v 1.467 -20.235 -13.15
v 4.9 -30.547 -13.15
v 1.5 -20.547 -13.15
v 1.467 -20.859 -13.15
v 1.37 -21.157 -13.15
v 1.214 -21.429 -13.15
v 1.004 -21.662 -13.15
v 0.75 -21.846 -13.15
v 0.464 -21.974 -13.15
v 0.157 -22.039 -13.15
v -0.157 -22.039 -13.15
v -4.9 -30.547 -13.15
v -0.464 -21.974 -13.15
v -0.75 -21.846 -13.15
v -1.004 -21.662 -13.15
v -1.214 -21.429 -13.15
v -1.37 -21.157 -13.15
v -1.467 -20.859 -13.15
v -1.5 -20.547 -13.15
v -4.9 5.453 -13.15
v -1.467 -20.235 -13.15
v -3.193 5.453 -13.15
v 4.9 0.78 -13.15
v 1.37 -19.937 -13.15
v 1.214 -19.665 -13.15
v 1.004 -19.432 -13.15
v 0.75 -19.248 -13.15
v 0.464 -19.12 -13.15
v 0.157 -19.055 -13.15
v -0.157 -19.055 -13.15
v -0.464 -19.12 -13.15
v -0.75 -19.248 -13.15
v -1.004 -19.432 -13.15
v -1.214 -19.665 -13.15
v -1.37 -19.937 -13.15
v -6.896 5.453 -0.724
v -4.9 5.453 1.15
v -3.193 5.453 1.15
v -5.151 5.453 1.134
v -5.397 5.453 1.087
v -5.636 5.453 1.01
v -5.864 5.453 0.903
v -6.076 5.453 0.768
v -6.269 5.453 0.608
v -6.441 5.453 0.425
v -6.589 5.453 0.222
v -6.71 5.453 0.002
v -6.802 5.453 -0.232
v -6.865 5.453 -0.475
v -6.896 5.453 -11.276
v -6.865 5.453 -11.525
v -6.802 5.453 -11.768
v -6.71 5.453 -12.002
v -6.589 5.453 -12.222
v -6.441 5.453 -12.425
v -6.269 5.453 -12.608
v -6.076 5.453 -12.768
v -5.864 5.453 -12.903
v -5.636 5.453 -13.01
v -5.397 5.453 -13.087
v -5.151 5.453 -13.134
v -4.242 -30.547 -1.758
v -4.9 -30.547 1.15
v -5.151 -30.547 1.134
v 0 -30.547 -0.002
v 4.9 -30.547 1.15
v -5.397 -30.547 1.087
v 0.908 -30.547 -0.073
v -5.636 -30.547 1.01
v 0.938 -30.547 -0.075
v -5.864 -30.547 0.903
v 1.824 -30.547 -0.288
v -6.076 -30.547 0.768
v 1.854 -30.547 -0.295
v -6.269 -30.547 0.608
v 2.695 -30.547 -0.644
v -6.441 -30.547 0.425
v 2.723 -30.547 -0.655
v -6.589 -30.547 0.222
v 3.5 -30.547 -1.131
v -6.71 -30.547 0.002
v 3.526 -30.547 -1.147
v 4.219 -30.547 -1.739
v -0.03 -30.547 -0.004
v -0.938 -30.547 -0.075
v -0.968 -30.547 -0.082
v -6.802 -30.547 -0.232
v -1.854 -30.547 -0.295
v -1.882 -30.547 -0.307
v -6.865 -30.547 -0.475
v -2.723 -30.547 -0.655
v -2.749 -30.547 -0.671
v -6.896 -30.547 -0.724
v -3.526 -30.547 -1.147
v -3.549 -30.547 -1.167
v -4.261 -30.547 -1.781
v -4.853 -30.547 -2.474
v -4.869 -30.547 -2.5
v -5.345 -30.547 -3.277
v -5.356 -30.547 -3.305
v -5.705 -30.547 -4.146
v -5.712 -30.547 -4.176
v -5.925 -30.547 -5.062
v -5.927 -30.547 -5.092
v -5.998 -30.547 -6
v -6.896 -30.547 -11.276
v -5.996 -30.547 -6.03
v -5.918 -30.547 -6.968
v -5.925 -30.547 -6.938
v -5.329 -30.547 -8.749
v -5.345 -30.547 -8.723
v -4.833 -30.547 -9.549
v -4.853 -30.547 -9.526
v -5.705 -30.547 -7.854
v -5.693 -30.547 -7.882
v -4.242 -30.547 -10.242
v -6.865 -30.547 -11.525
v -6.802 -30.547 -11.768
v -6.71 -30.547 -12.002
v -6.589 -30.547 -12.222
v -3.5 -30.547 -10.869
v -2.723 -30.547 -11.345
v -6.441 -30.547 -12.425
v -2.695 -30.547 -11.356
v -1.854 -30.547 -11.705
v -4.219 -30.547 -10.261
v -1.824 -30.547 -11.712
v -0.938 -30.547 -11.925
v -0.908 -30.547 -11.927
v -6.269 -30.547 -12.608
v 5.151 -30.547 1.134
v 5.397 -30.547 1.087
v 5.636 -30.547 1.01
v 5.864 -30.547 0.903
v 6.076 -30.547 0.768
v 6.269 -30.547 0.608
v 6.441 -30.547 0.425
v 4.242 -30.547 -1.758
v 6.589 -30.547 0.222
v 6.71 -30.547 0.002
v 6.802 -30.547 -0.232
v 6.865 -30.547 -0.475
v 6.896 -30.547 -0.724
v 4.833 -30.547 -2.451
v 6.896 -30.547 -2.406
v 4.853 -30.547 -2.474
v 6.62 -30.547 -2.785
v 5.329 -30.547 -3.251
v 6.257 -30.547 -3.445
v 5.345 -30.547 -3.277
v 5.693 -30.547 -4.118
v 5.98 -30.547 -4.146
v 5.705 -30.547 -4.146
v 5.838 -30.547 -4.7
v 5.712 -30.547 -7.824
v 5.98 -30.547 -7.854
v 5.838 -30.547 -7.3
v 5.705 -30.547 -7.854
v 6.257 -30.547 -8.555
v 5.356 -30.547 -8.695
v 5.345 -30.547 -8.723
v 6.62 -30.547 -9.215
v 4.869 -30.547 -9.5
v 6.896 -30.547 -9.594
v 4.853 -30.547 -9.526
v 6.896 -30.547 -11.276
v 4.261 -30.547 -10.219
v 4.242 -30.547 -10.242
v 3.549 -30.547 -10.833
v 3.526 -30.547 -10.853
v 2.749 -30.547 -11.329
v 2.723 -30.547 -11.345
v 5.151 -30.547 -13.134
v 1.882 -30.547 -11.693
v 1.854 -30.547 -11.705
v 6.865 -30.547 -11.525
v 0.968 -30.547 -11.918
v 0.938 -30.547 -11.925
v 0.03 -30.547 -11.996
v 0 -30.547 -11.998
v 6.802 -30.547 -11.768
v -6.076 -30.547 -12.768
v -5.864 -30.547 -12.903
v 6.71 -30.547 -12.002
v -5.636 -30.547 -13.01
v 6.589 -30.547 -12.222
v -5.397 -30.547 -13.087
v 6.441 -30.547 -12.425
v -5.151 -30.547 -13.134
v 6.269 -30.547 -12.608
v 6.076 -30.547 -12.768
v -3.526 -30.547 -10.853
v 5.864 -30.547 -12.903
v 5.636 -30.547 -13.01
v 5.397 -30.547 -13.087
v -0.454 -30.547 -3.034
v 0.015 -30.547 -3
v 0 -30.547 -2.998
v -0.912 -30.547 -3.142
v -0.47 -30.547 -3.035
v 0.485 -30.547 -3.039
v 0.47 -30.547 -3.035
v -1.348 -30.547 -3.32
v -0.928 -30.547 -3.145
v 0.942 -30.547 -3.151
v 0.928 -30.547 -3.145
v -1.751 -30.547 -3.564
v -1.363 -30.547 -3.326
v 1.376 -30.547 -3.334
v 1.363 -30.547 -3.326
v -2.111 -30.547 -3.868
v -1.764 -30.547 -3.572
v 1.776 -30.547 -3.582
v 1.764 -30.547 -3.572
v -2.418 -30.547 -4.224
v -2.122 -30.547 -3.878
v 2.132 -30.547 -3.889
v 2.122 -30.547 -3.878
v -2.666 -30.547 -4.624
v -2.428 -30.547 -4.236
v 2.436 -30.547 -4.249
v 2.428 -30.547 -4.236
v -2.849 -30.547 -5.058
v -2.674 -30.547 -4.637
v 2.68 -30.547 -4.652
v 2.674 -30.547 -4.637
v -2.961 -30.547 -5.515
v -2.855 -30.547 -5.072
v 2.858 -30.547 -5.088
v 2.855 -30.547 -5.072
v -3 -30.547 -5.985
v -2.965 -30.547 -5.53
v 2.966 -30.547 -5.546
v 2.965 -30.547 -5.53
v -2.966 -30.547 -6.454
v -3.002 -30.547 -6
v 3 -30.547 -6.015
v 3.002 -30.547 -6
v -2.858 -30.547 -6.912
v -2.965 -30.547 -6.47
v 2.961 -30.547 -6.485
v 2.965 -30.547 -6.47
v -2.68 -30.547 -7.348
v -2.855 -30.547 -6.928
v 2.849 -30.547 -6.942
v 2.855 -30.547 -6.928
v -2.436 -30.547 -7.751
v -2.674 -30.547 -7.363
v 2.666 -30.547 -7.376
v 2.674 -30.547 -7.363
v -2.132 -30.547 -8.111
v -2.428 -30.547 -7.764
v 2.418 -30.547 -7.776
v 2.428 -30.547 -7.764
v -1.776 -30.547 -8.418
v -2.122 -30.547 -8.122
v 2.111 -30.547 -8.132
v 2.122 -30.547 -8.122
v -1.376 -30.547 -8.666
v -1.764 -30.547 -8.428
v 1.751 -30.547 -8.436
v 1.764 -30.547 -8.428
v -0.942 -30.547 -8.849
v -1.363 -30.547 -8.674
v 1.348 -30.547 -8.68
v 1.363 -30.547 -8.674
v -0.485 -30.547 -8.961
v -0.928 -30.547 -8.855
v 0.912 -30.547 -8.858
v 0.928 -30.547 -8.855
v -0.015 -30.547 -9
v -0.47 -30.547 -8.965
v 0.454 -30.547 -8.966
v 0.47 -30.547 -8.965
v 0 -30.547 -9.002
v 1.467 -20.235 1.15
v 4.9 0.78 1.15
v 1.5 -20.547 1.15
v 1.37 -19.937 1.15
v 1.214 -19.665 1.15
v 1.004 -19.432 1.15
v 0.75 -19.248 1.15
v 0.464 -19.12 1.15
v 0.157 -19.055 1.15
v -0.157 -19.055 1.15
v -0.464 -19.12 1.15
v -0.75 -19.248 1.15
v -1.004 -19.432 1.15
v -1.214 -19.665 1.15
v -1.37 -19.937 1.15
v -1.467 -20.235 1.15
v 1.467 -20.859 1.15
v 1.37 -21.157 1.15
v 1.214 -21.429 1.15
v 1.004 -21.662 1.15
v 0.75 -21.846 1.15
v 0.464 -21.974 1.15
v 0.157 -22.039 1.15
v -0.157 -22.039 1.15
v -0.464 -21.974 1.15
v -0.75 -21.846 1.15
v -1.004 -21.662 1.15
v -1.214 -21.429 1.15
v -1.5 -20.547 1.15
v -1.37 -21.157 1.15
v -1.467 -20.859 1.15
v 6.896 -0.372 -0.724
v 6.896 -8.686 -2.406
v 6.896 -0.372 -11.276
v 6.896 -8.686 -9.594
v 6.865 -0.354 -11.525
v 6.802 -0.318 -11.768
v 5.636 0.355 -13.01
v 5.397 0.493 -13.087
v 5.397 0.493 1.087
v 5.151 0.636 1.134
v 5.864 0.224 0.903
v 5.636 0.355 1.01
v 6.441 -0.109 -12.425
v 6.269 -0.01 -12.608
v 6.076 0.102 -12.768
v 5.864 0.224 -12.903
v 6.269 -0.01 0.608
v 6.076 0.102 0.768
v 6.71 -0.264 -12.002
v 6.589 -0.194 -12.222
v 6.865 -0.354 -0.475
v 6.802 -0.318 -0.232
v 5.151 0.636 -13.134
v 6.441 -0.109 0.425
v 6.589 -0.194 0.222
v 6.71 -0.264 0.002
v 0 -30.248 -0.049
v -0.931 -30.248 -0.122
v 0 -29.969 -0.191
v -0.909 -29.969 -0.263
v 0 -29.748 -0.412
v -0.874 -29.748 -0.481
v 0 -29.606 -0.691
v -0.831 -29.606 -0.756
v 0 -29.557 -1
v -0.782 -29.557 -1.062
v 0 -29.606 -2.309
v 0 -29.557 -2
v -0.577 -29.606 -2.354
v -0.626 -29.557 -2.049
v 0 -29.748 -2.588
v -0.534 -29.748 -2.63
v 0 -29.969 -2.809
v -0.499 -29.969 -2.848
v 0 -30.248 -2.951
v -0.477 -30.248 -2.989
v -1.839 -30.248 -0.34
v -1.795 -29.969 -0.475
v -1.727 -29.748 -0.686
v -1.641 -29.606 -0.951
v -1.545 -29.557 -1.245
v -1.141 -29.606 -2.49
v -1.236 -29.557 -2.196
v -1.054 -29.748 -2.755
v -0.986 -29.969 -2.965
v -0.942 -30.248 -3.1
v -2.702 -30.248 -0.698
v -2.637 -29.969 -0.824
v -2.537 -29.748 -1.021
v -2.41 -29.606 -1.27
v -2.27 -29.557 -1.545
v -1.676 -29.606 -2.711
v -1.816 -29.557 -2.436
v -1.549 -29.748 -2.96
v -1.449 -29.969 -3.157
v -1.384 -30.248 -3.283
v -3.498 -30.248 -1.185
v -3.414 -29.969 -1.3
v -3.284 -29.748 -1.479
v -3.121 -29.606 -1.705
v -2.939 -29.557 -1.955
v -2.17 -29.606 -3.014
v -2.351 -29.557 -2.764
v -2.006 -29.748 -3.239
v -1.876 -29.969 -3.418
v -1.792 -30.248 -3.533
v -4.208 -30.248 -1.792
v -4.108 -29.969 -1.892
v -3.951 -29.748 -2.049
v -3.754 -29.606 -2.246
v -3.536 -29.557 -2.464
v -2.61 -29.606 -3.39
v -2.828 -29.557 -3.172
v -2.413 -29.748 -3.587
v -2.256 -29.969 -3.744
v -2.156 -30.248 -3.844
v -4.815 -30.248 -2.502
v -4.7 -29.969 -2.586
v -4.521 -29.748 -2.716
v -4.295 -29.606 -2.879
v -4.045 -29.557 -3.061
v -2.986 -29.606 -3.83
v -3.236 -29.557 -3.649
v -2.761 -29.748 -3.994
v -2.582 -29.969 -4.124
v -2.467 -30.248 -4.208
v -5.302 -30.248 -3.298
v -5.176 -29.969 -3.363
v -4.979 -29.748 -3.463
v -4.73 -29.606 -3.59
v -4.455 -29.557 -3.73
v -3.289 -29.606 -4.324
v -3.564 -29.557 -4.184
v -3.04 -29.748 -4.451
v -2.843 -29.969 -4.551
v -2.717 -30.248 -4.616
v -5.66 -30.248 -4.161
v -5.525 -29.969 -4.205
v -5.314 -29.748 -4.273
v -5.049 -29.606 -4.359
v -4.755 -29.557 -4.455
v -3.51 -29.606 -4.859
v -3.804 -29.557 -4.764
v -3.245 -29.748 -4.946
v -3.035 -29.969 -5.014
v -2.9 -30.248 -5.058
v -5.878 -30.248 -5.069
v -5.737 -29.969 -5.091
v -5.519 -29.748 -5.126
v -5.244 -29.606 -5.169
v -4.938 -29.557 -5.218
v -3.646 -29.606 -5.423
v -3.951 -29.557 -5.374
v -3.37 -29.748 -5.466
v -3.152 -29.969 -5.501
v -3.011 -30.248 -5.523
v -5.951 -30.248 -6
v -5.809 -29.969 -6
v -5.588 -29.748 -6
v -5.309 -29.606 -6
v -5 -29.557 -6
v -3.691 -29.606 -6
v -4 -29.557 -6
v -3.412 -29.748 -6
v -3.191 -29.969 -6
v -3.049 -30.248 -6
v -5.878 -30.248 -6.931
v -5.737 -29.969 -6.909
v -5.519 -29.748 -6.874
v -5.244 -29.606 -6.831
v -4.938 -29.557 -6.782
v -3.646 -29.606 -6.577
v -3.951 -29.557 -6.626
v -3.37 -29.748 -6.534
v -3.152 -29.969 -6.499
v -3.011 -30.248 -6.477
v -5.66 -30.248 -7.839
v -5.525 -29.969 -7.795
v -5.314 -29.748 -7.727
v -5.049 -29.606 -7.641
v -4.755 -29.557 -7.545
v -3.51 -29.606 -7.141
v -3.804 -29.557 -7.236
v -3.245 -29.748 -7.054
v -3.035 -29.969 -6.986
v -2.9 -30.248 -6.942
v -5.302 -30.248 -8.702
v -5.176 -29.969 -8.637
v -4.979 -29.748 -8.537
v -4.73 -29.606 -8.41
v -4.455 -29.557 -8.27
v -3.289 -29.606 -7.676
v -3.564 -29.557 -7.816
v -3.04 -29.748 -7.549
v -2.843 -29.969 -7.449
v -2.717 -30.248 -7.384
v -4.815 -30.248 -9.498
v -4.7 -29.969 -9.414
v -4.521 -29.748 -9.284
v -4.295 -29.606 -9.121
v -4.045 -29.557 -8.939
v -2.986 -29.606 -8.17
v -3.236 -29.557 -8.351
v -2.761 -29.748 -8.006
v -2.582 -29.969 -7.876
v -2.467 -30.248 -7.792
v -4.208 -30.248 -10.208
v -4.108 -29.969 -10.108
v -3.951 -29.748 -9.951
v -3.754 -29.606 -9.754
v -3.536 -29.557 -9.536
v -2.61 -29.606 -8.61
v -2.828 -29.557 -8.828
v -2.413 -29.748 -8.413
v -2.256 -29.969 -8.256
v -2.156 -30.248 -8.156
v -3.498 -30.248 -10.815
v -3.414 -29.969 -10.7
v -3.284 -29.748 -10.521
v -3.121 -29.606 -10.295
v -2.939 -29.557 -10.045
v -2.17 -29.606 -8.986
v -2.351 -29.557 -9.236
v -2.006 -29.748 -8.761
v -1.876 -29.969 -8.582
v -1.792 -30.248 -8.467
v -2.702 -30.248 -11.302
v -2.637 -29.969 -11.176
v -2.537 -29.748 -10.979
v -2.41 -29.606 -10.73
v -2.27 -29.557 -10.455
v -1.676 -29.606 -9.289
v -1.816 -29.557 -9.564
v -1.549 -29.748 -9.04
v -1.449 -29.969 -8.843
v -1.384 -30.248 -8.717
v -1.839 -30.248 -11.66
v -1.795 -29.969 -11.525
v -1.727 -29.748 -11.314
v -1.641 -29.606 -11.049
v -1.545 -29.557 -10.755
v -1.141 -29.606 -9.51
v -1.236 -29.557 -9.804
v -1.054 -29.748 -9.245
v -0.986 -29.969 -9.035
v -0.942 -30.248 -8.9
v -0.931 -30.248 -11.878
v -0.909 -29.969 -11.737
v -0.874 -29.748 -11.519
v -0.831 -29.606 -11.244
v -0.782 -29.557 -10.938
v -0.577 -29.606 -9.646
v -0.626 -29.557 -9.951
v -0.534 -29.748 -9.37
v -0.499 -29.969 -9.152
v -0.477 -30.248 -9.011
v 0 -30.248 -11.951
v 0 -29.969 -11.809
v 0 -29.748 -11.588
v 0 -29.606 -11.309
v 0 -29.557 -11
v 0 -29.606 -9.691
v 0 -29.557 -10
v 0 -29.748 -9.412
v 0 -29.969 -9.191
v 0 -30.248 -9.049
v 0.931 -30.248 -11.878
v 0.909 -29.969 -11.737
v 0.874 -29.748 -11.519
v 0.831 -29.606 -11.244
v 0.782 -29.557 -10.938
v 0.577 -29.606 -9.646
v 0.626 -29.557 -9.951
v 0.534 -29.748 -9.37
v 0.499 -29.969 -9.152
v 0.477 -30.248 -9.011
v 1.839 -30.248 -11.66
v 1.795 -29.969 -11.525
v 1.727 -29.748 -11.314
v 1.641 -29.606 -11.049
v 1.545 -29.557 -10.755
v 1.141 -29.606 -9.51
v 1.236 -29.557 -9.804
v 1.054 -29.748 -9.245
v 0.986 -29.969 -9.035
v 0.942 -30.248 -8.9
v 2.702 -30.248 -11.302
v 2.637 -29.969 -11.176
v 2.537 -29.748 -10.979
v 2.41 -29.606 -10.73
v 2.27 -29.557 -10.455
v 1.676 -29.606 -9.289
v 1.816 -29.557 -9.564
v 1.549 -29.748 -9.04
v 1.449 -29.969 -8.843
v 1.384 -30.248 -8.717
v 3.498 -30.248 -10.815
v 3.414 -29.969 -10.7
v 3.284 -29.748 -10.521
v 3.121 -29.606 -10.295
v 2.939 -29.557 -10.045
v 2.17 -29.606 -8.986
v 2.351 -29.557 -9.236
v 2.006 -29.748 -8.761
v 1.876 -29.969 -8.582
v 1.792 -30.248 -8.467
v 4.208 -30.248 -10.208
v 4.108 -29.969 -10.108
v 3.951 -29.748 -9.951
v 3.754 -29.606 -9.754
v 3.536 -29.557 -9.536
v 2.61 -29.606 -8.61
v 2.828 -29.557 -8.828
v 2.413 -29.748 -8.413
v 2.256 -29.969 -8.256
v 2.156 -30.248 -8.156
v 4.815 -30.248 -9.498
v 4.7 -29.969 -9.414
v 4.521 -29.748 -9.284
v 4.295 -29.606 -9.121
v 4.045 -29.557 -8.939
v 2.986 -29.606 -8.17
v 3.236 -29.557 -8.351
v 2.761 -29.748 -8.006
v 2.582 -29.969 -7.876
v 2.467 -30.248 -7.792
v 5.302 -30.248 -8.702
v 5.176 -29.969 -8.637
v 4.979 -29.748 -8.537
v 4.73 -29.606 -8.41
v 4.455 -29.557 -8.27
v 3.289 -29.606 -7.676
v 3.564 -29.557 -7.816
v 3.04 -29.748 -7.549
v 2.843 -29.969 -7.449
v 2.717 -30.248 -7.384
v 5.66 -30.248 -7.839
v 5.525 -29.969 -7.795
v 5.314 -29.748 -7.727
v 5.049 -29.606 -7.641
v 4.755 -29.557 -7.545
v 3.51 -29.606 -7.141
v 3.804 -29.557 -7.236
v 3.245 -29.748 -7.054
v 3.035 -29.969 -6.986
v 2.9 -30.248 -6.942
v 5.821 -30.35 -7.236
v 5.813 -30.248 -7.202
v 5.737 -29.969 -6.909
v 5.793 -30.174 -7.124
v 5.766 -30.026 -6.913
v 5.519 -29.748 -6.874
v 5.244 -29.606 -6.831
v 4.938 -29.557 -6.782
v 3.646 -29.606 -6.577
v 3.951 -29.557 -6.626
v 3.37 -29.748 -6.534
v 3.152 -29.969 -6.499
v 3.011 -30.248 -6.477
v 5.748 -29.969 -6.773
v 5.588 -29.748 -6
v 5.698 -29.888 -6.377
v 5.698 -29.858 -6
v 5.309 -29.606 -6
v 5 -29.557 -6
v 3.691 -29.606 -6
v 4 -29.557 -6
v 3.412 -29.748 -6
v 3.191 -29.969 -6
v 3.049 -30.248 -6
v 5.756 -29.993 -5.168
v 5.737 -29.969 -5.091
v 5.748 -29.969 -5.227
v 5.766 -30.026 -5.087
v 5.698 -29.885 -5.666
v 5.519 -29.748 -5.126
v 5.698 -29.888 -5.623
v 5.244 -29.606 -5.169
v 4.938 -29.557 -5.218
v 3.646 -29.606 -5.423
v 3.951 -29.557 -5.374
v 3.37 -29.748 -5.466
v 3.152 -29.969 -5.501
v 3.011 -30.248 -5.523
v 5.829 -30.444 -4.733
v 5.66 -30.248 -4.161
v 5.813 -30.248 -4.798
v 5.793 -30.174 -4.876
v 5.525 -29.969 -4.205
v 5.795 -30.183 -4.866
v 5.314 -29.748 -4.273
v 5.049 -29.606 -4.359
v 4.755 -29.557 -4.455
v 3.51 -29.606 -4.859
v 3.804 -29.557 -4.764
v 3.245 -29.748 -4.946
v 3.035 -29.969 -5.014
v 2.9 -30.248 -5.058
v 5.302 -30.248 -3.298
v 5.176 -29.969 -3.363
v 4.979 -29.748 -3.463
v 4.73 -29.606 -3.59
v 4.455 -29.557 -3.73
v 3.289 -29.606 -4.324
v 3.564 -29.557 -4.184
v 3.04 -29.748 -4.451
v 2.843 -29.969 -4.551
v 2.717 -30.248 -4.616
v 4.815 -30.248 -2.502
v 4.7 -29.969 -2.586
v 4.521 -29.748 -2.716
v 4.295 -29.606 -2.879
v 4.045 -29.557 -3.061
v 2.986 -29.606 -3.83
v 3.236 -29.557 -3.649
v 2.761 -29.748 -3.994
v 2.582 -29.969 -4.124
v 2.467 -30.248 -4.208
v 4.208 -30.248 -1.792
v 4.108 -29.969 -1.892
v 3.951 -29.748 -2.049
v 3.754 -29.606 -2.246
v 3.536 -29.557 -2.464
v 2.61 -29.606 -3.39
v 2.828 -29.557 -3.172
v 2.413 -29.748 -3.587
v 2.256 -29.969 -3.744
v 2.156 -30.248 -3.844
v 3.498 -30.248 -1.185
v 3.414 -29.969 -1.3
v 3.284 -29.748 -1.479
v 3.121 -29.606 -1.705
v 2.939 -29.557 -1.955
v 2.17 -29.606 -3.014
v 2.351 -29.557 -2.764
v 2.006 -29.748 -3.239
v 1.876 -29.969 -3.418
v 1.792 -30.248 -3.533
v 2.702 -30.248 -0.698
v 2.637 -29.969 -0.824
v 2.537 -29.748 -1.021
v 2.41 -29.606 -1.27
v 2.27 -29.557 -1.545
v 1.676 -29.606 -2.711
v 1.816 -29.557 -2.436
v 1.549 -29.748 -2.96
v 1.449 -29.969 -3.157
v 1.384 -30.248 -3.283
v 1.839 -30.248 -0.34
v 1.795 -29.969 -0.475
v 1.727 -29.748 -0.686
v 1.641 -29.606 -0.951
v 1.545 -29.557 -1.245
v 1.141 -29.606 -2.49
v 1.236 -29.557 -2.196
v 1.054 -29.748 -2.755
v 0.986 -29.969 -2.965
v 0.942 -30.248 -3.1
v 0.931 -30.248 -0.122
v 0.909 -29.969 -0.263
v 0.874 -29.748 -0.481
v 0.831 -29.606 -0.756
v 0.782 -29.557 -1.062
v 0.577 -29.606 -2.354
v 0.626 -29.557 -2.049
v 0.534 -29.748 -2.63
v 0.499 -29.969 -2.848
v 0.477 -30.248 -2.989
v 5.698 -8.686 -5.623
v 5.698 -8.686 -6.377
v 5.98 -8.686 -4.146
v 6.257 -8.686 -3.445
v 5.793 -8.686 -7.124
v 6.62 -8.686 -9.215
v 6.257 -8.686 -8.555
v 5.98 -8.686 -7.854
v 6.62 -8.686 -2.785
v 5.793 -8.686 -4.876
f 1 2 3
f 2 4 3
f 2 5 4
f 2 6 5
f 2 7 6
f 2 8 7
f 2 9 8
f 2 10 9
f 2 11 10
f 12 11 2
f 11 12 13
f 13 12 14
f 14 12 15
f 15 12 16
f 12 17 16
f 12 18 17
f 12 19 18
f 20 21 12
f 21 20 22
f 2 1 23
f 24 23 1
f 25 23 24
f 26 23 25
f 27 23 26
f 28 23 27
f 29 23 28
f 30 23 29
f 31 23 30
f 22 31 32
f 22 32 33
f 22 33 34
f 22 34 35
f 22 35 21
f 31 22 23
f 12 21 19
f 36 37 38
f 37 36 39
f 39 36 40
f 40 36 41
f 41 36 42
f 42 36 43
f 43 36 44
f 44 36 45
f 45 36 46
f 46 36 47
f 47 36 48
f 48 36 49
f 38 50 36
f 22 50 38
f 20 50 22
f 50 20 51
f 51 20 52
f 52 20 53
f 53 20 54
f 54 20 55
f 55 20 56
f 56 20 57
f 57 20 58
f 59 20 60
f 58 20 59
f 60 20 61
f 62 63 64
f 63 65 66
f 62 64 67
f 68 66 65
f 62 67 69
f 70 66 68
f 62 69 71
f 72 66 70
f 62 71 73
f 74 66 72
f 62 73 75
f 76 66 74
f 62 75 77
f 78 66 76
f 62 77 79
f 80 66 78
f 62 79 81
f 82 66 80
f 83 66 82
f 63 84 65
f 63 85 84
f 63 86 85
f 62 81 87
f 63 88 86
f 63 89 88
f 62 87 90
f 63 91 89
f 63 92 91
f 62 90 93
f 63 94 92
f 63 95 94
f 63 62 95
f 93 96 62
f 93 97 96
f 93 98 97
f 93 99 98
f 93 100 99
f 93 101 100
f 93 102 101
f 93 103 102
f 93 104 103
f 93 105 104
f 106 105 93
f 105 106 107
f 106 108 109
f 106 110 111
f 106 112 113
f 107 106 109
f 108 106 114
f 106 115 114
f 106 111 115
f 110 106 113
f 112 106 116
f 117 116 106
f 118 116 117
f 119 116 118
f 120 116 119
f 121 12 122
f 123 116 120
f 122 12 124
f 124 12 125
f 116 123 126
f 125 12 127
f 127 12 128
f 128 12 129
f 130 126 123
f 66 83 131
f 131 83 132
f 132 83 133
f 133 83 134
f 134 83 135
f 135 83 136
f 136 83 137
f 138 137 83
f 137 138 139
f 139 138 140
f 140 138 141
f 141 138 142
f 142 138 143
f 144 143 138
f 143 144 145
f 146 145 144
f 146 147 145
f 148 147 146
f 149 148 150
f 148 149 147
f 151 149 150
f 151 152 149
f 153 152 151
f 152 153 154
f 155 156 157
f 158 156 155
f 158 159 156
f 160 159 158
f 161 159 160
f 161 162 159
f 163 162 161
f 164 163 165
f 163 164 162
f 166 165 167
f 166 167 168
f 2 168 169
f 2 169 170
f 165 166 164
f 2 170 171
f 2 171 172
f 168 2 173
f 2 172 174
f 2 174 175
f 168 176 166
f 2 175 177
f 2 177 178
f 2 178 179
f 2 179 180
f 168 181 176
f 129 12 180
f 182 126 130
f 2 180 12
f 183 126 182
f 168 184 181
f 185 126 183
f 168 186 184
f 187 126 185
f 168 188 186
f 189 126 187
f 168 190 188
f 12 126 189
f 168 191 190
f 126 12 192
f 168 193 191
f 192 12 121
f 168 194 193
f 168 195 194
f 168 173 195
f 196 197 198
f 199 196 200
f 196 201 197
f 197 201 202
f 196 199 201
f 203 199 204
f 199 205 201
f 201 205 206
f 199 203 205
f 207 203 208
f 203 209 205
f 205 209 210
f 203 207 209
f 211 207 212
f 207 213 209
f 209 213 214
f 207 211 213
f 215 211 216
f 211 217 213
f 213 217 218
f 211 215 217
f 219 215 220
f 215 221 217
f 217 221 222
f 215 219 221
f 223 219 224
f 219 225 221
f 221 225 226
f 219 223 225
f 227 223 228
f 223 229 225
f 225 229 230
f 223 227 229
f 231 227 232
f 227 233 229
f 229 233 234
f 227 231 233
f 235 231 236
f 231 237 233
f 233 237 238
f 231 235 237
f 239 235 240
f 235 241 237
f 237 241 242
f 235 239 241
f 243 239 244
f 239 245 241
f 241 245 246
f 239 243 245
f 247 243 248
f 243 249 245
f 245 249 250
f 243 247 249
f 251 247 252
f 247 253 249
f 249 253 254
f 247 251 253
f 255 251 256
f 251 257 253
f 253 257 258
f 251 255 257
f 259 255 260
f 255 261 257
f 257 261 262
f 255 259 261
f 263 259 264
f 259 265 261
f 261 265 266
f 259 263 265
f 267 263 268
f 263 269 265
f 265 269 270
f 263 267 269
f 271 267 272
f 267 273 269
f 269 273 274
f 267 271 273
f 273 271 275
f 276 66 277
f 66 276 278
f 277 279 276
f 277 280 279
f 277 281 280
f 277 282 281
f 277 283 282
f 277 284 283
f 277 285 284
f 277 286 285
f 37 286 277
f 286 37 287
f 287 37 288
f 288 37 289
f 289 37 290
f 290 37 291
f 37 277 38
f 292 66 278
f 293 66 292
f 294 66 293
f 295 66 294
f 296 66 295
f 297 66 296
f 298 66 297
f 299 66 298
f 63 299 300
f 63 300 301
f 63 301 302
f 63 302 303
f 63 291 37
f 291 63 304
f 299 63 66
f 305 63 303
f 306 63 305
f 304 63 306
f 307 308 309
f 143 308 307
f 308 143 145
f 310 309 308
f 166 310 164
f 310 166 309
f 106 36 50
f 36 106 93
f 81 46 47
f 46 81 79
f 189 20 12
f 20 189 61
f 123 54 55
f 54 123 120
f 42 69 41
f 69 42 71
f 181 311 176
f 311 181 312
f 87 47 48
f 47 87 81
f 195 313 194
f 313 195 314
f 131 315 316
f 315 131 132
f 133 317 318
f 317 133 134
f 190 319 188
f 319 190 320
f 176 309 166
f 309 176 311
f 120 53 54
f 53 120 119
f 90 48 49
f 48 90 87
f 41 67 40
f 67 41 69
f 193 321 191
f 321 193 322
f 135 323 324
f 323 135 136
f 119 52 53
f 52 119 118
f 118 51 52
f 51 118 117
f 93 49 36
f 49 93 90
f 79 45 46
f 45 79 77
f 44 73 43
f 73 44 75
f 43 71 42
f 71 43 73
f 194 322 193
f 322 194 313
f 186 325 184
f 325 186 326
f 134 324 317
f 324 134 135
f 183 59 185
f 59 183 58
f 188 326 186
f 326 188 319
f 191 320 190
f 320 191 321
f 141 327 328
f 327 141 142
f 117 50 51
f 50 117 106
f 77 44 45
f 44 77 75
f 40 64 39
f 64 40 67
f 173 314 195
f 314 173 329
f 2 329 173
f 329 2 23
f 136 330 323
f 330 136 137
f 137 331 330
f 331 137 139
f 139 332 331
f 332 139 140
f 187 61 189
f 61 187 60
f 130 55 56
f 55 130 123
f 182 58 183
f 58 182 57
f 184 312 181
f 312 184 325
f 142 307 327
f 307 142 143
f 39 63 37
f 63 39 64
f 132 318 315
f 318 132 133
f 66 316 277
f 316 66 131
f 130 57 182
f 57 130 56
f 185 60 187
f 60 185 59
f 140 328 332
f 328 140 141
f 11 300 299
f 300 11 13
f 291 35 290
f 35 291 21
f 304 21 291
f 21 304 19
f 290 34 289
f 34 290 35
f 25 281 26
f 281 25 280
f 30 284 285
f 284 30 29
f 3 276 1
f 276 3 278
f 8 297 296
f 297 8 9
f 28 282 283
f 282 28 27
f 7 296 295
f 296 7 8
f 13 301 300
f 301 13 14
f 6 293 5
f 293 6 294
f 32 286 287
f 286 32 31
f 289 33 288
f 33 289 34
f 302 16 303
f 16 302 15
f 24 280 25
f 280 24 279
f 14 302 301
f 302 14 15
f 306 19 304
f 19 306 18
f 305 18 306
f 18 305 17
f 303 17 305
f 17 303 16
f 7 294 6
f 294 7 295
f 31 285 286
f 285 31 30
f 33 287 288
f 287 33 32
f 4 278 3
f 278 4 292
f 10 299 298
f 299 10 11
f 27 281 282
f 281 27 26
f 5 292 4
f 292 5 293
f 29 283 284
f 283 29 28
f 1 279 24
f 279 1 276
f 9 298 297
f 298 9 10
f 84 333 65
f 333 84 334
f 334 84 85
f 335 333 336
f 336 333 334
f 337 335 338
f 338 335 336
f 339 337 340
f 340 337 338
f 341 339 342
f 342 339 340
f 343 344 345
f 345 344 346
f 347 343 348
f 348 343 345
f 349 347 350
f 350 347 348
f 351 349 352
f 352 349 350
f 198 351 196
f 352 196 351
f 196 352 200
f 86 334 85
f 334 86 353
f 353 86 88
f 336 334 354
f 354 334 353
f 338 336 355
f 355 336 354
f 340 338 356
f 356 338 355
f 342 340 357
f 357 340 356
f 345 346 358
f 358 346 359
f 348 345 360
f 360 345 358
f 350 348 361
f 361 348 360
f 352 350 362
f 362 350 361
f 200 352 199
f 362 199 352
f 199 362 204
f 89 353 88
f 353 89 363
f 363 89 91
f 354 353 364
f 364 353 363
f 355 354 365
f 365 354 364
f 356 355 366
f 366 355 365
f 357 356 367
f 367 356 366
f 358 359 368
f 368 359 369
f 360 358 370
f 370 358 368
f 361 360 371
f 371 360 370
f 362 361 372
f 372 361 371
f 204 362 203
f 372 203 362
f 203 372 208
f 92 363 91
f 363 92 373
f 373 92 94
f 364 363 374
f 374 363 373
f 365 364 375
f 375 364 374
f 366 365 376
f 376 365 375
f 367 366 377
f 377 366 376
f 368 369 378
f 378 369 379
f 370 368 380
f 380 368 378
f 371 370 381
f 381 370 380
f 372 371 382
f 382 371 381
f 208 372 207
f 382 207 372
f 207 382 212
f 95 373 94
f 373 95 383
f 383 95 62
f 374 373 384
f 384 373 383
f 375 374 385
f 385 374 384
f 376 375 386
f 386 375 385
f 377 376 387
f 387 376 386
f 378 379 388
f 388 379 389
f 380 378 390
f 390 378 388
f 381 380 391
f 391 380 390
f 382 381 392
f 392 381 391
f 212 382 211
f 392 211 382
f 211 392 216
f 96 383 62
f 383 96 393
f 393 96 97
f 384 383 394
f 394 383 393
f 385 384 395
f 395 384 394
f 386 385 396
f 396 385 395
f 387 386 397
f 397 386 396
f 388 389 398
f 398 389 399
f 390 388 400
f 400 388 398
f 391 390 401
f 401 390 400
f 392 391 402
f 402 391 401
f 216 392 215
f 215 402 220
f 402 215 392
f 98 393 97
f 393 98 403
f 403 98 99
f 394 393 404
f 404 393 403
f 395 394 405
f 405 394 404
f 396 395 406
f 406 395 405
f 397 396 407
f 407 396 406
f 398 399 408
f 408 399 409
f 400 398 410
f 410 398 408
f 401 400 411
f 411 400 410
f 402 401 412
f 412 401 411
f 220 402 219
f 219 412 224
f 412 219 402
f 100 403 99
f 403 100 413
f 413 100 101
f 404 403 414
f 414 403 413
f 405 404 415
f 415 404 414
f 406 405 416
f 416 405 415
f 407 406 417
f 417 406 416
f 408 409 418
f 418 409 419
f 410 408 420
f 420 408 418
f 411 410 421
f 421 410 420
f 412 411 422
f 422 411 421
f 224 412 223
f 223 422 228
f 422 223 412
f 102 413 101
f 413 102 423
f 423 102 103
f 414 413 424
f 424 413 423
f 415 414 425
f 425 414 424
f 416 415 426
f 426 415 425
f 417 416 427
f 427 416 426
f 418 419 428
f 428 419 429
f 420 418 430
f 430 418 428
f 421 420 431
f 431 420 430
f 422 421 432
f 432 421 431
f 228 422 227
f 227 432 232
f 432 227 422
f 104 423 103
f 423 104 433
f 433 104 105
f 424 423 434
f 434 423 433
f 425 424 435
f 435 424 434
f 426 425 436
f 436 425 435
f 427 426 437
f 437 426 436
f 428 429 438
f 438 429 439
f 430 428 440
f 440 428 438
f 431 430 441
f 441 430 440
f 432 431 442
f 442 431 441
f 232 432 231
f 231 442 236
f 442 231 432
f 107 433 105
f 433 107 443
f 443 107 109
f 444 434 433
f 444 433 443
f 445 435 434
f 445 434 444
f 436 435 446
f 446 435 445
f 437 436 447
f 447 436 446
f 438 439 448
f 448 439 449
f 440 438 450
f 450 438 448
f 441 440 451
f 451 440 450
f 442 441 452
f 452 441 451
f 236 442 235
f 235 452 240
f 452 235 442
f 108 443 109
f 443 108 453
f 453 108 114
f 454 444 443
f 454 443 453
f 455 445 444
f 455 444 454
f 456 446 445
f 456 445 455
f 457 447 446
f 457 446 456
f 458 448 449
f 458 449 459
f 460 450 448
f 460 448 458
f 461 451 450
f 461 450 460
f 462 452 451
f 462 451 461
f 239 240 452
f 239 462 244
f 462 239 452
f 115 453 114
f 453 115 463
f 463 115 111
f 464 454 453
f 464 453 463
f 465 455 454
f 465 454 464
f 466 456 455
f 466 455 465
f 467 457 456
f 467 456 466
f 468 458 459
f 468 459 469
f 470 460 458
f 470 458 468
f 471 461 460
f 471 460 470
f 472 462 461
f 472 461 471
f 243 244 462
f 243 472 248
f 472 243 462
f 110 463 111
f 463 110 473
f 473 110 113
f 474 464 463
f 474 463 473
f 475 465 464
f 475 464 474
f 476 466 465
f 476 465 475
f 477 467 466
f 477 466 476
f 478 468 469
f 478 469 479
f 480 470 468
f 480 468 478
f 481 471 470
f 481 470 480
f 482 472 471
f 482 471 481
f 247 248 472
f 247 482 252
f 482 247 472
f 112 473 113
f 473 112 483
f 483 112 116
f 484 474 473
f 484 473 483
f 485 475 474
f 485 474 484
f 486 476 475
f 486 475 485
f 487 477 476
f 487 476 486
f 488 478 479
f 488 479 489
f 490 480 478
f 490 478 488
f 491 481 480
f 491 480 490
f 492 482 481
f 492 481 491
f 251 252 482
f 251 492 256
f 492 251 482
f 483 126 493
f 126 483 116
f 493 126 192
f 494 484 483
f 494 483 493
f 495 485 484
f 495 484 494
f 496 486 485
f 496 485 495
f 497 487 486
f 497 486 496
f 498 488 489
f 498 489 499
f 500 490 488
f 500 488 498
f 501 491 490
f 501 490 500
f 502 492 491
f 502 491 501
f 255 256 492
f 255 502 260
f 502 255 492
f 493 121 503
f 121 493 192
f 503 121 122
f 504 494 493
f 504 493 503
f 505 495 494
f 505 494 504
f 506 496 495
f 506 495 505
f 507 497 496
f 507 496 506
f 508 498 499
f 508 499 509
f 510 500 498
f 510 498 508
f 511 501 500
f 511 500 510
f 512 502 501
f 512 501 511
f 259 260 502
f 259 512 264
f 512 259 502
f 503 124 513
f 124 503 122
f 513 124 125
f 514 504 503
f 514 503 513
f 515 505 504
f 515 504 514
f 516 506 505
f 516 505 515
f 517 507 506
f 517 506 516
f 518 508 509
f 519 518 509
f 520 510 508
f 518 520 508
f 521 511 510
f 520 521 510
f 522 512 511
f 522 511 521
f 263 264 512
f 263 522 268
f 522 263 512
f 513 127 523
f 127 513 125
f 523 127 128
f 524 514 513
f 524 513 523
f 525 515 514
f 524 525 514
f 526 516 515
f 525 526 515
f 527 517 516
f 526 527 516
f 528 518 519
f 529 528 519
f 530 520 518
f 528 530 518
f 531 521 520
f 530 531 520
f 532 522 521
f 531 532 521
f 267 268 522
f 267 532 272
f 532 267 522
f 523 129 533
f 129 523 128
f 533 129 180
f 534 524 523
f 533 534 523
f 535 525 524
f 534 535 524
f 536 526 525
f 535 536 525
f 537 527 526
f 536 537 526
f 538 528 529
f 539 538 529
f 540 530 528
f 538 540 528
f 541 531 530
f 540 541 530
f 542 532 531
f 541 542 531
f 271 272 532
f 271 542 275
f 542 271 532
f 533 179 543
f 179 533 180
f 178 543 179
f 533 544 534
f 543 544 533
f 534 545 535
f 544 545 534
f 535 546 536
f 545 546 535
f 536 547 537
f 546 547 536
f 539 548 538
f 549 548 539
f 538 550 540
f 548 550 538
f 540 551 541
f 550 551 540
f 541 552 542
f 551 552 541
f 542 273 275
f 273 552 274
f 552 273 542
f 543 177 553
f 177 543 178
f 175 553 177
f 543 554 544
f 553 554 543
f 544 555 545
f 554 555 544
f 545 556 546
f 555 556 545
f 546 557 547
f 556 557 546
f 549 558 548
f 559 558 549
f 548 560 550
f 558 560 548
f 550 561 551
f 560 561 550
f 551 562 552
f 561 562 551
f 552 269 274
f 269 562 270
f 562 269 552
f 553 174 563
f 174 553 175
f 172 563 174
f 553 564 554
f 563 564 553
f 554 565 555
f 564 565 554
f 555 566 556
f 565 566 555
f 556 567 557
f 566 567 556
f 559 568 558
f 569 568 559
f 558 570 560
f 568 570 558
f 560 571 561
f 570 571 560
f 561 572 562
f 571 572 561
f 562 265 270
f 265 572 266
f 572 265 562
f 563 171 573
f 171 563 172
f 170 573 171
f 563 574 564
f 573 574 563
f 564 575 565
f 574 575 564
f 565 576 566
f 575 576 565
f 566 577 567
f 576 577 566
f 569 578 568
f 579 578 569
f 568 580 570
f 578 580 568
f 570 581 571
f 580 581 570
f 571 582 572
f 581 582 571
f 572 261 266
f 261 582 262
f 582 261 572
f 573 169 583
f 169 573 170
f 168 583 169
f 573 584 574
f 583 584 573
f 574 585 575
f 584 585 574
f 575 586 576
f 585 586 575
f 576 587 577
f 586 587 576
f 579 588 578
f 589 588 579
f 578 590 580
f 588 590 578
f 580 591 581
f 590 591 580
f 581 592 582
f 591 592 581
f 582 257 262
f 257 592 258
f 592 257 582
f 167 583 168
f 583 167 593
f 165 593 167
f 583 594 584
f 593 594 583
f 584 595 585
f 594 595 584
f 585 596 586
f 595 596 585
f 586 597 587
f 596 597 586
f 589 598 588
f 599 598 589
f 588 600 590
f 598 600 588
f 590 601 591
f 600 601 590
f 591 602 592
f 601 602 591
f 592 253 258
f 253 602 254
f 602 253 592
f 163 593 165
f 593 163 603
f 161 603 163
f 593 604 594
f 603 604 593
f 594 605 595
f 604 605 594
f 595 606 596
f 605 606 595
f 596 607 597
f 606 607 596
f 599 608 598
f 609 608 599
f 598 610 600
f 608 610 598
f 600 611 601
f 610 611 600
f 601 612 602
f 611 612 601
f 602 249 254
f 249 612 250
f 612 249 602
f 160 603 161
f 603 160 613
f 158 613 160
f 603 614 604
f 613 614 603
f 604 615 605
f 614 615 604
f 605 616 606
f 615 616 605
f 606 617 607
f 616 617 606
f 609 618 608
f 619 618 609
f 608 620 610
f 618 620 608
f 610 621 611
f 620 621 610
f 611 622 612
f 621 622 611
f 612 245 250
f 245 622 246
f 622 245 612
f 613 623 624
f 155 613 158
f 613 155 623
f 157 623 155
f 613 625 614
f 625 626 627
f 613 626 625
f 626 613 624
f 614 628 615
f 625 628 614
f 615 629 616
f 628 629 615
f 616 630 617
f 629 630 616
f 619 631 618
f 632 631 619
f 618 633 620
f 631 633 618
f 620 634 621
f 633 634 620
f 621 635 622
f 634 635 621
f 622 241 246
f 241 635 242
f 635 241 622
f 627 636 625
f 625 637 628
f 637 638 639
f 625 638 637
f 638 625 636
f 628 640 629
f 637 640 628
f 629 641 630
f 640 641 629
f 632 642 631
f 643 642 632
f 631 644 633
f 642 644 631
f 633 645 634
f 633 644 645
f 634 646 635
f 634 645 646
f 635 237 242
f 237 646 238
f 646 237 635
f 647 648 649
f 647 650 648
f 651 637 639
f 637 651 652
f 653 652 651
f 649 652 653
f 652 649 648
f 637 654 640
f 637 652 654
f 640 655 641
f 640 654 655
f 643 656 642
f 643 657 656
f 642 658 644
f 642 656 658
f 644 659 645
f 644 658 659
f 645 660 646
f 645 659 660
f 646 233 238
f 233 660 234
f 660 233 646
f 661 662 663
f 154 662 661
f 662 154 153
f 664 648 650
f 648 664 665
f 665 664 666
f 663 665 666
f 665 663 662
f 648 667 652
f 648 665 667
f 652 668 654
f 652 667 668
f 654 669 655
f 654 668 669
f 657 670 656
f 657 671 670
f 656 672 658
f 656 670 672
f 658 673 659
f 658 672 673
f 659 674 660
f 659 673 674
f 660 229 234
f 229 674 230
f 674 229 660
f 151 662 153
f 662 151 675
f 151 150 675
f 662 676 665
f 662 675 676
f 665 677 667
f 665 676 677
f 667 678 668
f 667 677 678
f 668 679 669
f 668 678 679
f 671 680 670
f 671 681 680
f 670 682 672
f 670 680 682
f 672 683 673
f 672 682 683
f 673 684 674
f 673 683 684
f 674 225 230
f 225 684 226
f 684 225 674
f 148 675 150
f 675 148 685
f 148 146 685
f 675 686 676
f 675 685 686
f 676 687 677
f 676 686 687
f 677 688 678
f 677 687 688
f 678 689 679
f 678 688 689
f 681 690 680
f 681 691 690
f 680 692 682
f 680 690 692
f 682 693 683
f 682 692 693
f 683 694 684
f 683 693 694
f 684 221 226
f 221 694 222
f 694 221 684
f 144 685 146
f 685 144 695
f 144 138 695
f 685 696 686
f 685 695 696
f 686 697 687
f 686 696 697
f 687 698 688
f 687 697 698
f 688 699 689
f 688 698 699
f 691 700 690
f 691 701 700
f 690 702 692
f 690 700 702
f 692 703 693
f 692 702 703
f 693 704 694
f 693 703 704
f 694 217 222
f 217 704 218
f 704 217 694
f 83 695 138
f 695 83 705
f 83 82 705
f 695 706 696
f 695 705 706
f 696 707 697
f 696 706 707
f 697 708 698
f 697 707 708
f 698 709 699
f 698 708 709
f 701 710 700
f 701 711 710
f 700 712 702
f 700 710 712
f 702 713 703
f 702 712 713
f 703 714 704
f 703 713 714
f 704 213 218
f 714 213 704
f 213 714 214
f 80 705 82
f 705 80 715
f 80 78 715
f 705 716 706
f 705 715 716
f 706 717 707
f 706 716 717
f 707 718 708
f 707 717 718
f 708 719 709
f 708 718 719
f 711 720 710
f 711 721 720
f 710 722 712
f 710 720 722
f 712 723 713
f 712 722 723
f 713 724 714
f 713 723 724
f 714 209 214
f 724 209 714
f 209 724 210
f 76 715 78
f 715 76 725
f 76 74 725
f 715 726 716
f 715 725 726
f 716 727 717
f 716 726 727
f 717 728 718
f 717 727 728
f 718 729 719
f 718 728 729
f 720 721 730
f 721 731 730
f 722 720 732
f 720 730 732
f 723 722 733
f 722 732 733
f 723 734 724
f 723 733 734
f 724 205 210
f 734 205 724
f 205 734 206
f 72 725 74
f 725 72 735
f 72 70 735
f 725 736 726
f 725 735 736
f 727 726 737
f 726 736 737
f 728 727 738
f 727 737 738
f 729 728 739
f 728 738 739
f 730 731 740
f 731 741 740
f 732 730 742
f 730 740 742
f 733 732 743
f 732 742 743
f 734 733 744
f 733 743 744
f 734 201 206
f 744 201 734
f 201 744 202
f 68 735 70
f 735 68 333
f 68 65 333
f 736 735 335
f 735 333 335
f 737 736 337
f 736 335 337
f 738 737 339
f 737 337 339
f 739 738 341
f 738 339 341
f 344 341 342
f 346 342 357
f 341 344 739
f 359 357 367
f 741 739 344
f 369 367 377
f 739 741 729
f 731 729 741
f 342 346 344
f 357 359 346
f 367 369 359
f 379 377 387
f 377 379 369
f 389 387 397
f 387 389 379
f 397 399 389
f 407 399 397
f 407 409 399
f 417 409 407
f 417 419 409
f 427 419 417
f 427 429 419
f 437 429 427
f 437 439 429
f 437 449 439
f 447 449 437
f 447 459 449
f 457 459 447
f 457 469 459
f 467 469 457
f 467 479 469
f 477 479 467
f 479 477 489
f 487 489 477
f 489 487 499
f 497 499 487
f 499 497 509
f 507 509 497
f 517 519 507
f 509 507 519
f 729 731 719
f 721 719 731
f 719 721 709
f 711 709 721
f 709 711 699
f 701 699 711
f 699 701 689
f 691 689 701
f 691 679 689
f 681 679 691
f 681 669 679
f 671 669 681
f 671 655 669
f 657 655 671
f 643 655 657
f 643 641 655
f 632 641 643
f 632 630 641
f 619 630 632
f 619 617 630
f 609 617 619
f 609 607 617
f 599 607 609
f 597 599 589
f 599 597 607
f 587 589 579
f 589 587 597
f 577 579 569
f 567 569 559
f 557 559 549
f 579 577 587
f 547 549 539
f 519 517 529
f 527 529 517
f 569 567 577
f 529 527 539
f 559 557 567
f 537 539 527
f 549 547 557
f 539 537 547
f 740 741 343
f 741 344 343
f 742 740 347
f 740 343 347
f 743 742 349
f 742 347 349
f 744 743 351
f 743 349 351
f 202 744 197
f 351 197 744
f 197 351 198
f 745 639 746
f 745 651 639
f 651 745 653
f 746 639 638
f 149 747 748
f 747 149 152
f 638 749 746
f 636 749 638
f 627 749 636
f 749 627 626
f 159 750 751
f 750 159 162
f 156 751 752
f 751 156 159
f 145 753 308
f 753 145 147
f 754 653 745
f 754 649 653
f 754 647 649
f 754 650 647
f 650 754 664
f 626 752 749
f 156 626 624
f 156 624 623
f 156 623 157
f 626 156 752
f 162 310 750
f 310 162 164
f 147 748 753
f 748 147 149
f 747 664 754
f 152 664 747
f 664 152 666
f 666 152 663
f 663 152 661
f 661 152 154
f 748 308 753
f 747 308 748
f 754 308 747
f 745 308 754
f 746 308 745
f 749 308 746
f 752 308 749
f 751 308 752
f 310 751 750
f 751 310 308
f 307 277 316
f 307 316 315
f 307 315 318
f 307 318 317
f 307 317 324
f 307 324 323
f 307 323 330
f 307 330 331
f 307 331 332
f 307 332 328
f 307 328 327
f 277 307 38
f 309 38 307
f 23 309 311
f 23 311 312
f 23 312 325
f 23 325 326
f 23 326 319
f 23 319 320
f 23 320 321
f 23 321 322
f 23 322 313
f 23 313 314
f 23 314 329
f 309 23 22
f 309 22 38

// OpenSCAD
part="bolt"; //[bolt,shaft,catch,all]
id=8;
idw=id+.5;
t=2;
t2=3;
t3=-2.4;
tb=3;
h=36;
h2=h;
h3=14;
// Catch Offset
co=-.5;
// Catch Mount Hole Offset
cmho=6;
cdip=0;
so=20;
side=3; //[0:Both,1:Left,2:Right,3:Center Only]
backbump=0;
bumph=10;
bumpw=18;
bumpd=28;
boltang=60;
boltadj=5;
centerhole=2;
$fn=50;

*translate([0,1.5]) import("DoorLatch_FrontCatch2.stl");
if(part=="shaft"||part=="all")
{
  intersection(){
  translate([-11-(side==3||side==2?.5:12),-so-idw-5,-5]) {
    cube([side==3?22:(side==0?46:34),so+idw+22,50]);
    if(side==2)
      translate([-t2,0]) cube([t2+.01,idw+22,50]);
  }
difference(){
  union(){
    color("blue")
    translate([0,-so/2+idw-11.5]) {
      //box(d=id+so+t*5,h=h,w=id+t*5,bottom=1);
      translate([0,id-2]) box(d=so,h=h,w=id+t*5,bottom=1);
      translate([0,-so+id+t2]) box(d=id+t*5+t2,h=h,w=id+t*5+t2,bottom=1);
    }
    *if(so>0)
      translate([t-1.25,-so+5,-t]) cube([10,so+5,h]);
    //translate([-1.5*id,id/2+t/2+.8,0]) cube([id*3,3,h]);
    translate([0,t]) {
      translate([0,id/2+t*2,h/2-1]) rotate([90,0,0])
        box(w=id*4,d=h+2,h=4,top=1,r=1);
      if(side<1) translate([-1*id-3,id-10,2]) difference(){
        union(){
        cube([4,4,h-2]);
        translate([4,2,0]) sphere(2,center=true);
        }
        translate([0,0,-2.01])
          cylinder(r=4,h=h+8.02);
      }
      if(side==0||side==2) mirror([1,0,0]) translate([-1*id-3,id-10.5,2]) difference(){
        union(){
        cube([4,4,h-2]);
         translate([4,4,0]) sphere(r=2,center=true);
          *rotate([0,-45,0]) cube(4,center=true);
        }
        translate([0,0,-2.01])
          cylinder(r=4,h=h+8.02);
      }
    }
  }
  translate([0,-so,t]) box(d=id+t*3+.8,h=h,r=1);
  for(m=[0,1]) mirror([m,0,0])
  rotate([0,0,90]) translate([-so,id*-.6,18]) rotate([90,0,0]) box(d=h*.55,w=5,h=t*3,r=2.45);
  for(pos=[[id+6,id+t/2,5],
        [-1*id-6,id+t/2,5],
        [id+6,id+t*.5,h-7],
        [-1*id-6,id+t*.5,h-5],
        [0,id+t+.5,h-7],
        [0,id+t+.5,7]
        ])
      if(pos[0]!=0||centerhole==2||(centerhole==1&&pos[2]<8))
    translate(pos) rotate([90,0,0]) union() { cylinder(d=4,h=10); translate([0,0,4]) cylinder(d1=4,d2=9,h=2.01);
        translate([0,0,6]) cylinder(d=9,h=pos[0]==0?so+50:so-t2*2);
     }
}
}
} 
if(part=="bolt"||part=="all") {
  translate(part=="all"?[0,-so-6,50]:[]) rotate(part=="all"?[90,0]:[])
  rotate([0,90]) rotate([135,0,0])
  difference()
  {
    translate([6,h2*.6,h2*.6]) rotate([45+90,0,0])
    {
      difference()
      {
          box(w=idw+t+tb+.8,d=id+t+tb+.8,h=h2);
          translate([-20,0,10]) rotate([90,0,90]) cylinder(d=3,h=30,$fn=30);
          translate([0,0,-.01]) rotate_extrude($fn=40) translate([5,0]) hull() { circle(d=2,$fn=20); translate([-1,0]) circle(d=2,$fn=20); }
//        cylinder(d=12.6,h=2,$fn=50);
      }
    }
    translate([6,-16,0]) rotate([-45,0]) translate([0,23,20]) cylinder(d=12,h=30,$fn=50);
    translate([0,0,-50-boltadj]) rotate([45-boltang,0]) cube(100,center=true);
  }
}
if(part=="catch"||part=="all") {
  intersection(){
    translate([-29.25+(side==2?17.5:-2),-idw/2-co-14.2]) cube([43+(side==0?20:0),idw+co+20,24+bumph]);
  //translate([id*6,0,h3]) mirror([0,0,0]) 
  //translate([0,0,h+5])
  {
//        translate([-.5*(id+t*5),-.5*(h3+t*5),0]) cube([id+t*5,h3+t*5,0.1]);
    difference()
    {
      union(){
        //color("blue")
        translate([0,-co/2-t3/2,1.5]) box(d=idw+t*5.5+t3/2+co,h=h3-cdip+.5,w=id+t*6,top=0,bottom=1,r=4);
        if(backbump){
          intersection() {
            translate([0,-co-idw/2-t*2.5,-2.5]) box(d=bumpd+t*4,h=h3-cdip+bumph,w=bumpw,top=1,bottom=1,r=4,center=0);
            translate([id-t+1,-co*1.5,0]) {
              cube([bumpw/2,bumpd+10,bumph+h3-cdip+6]);
              translate([-4,0]) cube([5,idw*2,h3-cdip+2]);
            }
          }
        }
        //translate([id*-1.5,id/2+t-.8]) cube([id*3,3,h3]);
        translate([0,idw/2+t*3-.2,h3/2]) rotate([90,0,0]) box(w=id+cmho*2+t*14,d=h3+4,h=5,top=1,r=1);
        for(m=[0,1]) mirror([m,0])
        translate([-1*id-t-1,idw/2-3.5,0]) difference(){
          union(){
          cube([4,5,h3-cdip+2]);
          *translate([4,2,h3-cdip-2]) sphere(2,center=true);
          }
          for(m=[0,1])
          mirror([0,0,m]) translate([1,3,m==0?-5:-7-h3+cdip]) rotate([45,0,-45]) translate([-2,0]) cube([8,5,8]);
          translate([-1.2,0,-0.01])
            cylinder(r=4,h=h3+cdip+4.02);
        }
      if(cdip>2)
        translate([idw/-2-t*3,3.2,h3-cdip+5]) rotate([0,90,0]) difference() {
          translate([0,0]) cube([6,6,idw+t*6]);
          translate([0,0,-.01]) cylinder(d=6,h=idw+t*6+.02,$fn=40);
        }
      }
      translate([0,-co+t/4+.7,3]) box(d=idw+t*4+t3+.4,h=h3+2.02,w=id+t*3+1.8,r=2.5,bottom=1);
      //holes:
      cht=[15,-15];
      if(centerhole)
        translate([0,14,h3/2+1]) rotate([90,0]) {
          translate([0,0,10]) cylinder(d=7,h=20,$fn=40);
          linear_extrude(35) circle(d=4,$fn=30);
          *translate([0,0,2.49]) linear_extrude(3) hull() {
            circle(d=4,$fn=30); translate(cht) circle(d=8,$fn=30); }
        }
      translate([0,0,1]) {
        for(x=(side==1?[-1*id-cmho]:(side==0?[-1*id-cmho,id+cmho]:(side==2?[id+cmho]:[]))))
      translate([x,idw+1,h3/2]) rotate([90,0,0]) union() { translate([0,0,-10]) cylinder(d=4,h=20); translate([0,0,4]) cylinder(d1=4,d2=9,h=2); translate([0,0,5.99]) cylinder(d=9,h=20); }
    }
    }
  }
  }
}

module box(d,h,w=0,r=2,top=0,bottom=0,center=1)
{
  translate(center?[]:[w/2,d/2,r])
  translate([(w==0?d:w)*-.5,d*-.5])
    intersection(){
      translate([0,0,bottom?-1*r:0]) cube([w==0?d:w,d,h+(top?r:0)+(bottom?r:0)]);
    minkowski() {
      sphere(r=r,h=1);
      translate([r,r]) cube([(w==0?d:w)-r*2,d-r*2,h]);
    }
  }
  //cylinder(d=d,h=h);
}
